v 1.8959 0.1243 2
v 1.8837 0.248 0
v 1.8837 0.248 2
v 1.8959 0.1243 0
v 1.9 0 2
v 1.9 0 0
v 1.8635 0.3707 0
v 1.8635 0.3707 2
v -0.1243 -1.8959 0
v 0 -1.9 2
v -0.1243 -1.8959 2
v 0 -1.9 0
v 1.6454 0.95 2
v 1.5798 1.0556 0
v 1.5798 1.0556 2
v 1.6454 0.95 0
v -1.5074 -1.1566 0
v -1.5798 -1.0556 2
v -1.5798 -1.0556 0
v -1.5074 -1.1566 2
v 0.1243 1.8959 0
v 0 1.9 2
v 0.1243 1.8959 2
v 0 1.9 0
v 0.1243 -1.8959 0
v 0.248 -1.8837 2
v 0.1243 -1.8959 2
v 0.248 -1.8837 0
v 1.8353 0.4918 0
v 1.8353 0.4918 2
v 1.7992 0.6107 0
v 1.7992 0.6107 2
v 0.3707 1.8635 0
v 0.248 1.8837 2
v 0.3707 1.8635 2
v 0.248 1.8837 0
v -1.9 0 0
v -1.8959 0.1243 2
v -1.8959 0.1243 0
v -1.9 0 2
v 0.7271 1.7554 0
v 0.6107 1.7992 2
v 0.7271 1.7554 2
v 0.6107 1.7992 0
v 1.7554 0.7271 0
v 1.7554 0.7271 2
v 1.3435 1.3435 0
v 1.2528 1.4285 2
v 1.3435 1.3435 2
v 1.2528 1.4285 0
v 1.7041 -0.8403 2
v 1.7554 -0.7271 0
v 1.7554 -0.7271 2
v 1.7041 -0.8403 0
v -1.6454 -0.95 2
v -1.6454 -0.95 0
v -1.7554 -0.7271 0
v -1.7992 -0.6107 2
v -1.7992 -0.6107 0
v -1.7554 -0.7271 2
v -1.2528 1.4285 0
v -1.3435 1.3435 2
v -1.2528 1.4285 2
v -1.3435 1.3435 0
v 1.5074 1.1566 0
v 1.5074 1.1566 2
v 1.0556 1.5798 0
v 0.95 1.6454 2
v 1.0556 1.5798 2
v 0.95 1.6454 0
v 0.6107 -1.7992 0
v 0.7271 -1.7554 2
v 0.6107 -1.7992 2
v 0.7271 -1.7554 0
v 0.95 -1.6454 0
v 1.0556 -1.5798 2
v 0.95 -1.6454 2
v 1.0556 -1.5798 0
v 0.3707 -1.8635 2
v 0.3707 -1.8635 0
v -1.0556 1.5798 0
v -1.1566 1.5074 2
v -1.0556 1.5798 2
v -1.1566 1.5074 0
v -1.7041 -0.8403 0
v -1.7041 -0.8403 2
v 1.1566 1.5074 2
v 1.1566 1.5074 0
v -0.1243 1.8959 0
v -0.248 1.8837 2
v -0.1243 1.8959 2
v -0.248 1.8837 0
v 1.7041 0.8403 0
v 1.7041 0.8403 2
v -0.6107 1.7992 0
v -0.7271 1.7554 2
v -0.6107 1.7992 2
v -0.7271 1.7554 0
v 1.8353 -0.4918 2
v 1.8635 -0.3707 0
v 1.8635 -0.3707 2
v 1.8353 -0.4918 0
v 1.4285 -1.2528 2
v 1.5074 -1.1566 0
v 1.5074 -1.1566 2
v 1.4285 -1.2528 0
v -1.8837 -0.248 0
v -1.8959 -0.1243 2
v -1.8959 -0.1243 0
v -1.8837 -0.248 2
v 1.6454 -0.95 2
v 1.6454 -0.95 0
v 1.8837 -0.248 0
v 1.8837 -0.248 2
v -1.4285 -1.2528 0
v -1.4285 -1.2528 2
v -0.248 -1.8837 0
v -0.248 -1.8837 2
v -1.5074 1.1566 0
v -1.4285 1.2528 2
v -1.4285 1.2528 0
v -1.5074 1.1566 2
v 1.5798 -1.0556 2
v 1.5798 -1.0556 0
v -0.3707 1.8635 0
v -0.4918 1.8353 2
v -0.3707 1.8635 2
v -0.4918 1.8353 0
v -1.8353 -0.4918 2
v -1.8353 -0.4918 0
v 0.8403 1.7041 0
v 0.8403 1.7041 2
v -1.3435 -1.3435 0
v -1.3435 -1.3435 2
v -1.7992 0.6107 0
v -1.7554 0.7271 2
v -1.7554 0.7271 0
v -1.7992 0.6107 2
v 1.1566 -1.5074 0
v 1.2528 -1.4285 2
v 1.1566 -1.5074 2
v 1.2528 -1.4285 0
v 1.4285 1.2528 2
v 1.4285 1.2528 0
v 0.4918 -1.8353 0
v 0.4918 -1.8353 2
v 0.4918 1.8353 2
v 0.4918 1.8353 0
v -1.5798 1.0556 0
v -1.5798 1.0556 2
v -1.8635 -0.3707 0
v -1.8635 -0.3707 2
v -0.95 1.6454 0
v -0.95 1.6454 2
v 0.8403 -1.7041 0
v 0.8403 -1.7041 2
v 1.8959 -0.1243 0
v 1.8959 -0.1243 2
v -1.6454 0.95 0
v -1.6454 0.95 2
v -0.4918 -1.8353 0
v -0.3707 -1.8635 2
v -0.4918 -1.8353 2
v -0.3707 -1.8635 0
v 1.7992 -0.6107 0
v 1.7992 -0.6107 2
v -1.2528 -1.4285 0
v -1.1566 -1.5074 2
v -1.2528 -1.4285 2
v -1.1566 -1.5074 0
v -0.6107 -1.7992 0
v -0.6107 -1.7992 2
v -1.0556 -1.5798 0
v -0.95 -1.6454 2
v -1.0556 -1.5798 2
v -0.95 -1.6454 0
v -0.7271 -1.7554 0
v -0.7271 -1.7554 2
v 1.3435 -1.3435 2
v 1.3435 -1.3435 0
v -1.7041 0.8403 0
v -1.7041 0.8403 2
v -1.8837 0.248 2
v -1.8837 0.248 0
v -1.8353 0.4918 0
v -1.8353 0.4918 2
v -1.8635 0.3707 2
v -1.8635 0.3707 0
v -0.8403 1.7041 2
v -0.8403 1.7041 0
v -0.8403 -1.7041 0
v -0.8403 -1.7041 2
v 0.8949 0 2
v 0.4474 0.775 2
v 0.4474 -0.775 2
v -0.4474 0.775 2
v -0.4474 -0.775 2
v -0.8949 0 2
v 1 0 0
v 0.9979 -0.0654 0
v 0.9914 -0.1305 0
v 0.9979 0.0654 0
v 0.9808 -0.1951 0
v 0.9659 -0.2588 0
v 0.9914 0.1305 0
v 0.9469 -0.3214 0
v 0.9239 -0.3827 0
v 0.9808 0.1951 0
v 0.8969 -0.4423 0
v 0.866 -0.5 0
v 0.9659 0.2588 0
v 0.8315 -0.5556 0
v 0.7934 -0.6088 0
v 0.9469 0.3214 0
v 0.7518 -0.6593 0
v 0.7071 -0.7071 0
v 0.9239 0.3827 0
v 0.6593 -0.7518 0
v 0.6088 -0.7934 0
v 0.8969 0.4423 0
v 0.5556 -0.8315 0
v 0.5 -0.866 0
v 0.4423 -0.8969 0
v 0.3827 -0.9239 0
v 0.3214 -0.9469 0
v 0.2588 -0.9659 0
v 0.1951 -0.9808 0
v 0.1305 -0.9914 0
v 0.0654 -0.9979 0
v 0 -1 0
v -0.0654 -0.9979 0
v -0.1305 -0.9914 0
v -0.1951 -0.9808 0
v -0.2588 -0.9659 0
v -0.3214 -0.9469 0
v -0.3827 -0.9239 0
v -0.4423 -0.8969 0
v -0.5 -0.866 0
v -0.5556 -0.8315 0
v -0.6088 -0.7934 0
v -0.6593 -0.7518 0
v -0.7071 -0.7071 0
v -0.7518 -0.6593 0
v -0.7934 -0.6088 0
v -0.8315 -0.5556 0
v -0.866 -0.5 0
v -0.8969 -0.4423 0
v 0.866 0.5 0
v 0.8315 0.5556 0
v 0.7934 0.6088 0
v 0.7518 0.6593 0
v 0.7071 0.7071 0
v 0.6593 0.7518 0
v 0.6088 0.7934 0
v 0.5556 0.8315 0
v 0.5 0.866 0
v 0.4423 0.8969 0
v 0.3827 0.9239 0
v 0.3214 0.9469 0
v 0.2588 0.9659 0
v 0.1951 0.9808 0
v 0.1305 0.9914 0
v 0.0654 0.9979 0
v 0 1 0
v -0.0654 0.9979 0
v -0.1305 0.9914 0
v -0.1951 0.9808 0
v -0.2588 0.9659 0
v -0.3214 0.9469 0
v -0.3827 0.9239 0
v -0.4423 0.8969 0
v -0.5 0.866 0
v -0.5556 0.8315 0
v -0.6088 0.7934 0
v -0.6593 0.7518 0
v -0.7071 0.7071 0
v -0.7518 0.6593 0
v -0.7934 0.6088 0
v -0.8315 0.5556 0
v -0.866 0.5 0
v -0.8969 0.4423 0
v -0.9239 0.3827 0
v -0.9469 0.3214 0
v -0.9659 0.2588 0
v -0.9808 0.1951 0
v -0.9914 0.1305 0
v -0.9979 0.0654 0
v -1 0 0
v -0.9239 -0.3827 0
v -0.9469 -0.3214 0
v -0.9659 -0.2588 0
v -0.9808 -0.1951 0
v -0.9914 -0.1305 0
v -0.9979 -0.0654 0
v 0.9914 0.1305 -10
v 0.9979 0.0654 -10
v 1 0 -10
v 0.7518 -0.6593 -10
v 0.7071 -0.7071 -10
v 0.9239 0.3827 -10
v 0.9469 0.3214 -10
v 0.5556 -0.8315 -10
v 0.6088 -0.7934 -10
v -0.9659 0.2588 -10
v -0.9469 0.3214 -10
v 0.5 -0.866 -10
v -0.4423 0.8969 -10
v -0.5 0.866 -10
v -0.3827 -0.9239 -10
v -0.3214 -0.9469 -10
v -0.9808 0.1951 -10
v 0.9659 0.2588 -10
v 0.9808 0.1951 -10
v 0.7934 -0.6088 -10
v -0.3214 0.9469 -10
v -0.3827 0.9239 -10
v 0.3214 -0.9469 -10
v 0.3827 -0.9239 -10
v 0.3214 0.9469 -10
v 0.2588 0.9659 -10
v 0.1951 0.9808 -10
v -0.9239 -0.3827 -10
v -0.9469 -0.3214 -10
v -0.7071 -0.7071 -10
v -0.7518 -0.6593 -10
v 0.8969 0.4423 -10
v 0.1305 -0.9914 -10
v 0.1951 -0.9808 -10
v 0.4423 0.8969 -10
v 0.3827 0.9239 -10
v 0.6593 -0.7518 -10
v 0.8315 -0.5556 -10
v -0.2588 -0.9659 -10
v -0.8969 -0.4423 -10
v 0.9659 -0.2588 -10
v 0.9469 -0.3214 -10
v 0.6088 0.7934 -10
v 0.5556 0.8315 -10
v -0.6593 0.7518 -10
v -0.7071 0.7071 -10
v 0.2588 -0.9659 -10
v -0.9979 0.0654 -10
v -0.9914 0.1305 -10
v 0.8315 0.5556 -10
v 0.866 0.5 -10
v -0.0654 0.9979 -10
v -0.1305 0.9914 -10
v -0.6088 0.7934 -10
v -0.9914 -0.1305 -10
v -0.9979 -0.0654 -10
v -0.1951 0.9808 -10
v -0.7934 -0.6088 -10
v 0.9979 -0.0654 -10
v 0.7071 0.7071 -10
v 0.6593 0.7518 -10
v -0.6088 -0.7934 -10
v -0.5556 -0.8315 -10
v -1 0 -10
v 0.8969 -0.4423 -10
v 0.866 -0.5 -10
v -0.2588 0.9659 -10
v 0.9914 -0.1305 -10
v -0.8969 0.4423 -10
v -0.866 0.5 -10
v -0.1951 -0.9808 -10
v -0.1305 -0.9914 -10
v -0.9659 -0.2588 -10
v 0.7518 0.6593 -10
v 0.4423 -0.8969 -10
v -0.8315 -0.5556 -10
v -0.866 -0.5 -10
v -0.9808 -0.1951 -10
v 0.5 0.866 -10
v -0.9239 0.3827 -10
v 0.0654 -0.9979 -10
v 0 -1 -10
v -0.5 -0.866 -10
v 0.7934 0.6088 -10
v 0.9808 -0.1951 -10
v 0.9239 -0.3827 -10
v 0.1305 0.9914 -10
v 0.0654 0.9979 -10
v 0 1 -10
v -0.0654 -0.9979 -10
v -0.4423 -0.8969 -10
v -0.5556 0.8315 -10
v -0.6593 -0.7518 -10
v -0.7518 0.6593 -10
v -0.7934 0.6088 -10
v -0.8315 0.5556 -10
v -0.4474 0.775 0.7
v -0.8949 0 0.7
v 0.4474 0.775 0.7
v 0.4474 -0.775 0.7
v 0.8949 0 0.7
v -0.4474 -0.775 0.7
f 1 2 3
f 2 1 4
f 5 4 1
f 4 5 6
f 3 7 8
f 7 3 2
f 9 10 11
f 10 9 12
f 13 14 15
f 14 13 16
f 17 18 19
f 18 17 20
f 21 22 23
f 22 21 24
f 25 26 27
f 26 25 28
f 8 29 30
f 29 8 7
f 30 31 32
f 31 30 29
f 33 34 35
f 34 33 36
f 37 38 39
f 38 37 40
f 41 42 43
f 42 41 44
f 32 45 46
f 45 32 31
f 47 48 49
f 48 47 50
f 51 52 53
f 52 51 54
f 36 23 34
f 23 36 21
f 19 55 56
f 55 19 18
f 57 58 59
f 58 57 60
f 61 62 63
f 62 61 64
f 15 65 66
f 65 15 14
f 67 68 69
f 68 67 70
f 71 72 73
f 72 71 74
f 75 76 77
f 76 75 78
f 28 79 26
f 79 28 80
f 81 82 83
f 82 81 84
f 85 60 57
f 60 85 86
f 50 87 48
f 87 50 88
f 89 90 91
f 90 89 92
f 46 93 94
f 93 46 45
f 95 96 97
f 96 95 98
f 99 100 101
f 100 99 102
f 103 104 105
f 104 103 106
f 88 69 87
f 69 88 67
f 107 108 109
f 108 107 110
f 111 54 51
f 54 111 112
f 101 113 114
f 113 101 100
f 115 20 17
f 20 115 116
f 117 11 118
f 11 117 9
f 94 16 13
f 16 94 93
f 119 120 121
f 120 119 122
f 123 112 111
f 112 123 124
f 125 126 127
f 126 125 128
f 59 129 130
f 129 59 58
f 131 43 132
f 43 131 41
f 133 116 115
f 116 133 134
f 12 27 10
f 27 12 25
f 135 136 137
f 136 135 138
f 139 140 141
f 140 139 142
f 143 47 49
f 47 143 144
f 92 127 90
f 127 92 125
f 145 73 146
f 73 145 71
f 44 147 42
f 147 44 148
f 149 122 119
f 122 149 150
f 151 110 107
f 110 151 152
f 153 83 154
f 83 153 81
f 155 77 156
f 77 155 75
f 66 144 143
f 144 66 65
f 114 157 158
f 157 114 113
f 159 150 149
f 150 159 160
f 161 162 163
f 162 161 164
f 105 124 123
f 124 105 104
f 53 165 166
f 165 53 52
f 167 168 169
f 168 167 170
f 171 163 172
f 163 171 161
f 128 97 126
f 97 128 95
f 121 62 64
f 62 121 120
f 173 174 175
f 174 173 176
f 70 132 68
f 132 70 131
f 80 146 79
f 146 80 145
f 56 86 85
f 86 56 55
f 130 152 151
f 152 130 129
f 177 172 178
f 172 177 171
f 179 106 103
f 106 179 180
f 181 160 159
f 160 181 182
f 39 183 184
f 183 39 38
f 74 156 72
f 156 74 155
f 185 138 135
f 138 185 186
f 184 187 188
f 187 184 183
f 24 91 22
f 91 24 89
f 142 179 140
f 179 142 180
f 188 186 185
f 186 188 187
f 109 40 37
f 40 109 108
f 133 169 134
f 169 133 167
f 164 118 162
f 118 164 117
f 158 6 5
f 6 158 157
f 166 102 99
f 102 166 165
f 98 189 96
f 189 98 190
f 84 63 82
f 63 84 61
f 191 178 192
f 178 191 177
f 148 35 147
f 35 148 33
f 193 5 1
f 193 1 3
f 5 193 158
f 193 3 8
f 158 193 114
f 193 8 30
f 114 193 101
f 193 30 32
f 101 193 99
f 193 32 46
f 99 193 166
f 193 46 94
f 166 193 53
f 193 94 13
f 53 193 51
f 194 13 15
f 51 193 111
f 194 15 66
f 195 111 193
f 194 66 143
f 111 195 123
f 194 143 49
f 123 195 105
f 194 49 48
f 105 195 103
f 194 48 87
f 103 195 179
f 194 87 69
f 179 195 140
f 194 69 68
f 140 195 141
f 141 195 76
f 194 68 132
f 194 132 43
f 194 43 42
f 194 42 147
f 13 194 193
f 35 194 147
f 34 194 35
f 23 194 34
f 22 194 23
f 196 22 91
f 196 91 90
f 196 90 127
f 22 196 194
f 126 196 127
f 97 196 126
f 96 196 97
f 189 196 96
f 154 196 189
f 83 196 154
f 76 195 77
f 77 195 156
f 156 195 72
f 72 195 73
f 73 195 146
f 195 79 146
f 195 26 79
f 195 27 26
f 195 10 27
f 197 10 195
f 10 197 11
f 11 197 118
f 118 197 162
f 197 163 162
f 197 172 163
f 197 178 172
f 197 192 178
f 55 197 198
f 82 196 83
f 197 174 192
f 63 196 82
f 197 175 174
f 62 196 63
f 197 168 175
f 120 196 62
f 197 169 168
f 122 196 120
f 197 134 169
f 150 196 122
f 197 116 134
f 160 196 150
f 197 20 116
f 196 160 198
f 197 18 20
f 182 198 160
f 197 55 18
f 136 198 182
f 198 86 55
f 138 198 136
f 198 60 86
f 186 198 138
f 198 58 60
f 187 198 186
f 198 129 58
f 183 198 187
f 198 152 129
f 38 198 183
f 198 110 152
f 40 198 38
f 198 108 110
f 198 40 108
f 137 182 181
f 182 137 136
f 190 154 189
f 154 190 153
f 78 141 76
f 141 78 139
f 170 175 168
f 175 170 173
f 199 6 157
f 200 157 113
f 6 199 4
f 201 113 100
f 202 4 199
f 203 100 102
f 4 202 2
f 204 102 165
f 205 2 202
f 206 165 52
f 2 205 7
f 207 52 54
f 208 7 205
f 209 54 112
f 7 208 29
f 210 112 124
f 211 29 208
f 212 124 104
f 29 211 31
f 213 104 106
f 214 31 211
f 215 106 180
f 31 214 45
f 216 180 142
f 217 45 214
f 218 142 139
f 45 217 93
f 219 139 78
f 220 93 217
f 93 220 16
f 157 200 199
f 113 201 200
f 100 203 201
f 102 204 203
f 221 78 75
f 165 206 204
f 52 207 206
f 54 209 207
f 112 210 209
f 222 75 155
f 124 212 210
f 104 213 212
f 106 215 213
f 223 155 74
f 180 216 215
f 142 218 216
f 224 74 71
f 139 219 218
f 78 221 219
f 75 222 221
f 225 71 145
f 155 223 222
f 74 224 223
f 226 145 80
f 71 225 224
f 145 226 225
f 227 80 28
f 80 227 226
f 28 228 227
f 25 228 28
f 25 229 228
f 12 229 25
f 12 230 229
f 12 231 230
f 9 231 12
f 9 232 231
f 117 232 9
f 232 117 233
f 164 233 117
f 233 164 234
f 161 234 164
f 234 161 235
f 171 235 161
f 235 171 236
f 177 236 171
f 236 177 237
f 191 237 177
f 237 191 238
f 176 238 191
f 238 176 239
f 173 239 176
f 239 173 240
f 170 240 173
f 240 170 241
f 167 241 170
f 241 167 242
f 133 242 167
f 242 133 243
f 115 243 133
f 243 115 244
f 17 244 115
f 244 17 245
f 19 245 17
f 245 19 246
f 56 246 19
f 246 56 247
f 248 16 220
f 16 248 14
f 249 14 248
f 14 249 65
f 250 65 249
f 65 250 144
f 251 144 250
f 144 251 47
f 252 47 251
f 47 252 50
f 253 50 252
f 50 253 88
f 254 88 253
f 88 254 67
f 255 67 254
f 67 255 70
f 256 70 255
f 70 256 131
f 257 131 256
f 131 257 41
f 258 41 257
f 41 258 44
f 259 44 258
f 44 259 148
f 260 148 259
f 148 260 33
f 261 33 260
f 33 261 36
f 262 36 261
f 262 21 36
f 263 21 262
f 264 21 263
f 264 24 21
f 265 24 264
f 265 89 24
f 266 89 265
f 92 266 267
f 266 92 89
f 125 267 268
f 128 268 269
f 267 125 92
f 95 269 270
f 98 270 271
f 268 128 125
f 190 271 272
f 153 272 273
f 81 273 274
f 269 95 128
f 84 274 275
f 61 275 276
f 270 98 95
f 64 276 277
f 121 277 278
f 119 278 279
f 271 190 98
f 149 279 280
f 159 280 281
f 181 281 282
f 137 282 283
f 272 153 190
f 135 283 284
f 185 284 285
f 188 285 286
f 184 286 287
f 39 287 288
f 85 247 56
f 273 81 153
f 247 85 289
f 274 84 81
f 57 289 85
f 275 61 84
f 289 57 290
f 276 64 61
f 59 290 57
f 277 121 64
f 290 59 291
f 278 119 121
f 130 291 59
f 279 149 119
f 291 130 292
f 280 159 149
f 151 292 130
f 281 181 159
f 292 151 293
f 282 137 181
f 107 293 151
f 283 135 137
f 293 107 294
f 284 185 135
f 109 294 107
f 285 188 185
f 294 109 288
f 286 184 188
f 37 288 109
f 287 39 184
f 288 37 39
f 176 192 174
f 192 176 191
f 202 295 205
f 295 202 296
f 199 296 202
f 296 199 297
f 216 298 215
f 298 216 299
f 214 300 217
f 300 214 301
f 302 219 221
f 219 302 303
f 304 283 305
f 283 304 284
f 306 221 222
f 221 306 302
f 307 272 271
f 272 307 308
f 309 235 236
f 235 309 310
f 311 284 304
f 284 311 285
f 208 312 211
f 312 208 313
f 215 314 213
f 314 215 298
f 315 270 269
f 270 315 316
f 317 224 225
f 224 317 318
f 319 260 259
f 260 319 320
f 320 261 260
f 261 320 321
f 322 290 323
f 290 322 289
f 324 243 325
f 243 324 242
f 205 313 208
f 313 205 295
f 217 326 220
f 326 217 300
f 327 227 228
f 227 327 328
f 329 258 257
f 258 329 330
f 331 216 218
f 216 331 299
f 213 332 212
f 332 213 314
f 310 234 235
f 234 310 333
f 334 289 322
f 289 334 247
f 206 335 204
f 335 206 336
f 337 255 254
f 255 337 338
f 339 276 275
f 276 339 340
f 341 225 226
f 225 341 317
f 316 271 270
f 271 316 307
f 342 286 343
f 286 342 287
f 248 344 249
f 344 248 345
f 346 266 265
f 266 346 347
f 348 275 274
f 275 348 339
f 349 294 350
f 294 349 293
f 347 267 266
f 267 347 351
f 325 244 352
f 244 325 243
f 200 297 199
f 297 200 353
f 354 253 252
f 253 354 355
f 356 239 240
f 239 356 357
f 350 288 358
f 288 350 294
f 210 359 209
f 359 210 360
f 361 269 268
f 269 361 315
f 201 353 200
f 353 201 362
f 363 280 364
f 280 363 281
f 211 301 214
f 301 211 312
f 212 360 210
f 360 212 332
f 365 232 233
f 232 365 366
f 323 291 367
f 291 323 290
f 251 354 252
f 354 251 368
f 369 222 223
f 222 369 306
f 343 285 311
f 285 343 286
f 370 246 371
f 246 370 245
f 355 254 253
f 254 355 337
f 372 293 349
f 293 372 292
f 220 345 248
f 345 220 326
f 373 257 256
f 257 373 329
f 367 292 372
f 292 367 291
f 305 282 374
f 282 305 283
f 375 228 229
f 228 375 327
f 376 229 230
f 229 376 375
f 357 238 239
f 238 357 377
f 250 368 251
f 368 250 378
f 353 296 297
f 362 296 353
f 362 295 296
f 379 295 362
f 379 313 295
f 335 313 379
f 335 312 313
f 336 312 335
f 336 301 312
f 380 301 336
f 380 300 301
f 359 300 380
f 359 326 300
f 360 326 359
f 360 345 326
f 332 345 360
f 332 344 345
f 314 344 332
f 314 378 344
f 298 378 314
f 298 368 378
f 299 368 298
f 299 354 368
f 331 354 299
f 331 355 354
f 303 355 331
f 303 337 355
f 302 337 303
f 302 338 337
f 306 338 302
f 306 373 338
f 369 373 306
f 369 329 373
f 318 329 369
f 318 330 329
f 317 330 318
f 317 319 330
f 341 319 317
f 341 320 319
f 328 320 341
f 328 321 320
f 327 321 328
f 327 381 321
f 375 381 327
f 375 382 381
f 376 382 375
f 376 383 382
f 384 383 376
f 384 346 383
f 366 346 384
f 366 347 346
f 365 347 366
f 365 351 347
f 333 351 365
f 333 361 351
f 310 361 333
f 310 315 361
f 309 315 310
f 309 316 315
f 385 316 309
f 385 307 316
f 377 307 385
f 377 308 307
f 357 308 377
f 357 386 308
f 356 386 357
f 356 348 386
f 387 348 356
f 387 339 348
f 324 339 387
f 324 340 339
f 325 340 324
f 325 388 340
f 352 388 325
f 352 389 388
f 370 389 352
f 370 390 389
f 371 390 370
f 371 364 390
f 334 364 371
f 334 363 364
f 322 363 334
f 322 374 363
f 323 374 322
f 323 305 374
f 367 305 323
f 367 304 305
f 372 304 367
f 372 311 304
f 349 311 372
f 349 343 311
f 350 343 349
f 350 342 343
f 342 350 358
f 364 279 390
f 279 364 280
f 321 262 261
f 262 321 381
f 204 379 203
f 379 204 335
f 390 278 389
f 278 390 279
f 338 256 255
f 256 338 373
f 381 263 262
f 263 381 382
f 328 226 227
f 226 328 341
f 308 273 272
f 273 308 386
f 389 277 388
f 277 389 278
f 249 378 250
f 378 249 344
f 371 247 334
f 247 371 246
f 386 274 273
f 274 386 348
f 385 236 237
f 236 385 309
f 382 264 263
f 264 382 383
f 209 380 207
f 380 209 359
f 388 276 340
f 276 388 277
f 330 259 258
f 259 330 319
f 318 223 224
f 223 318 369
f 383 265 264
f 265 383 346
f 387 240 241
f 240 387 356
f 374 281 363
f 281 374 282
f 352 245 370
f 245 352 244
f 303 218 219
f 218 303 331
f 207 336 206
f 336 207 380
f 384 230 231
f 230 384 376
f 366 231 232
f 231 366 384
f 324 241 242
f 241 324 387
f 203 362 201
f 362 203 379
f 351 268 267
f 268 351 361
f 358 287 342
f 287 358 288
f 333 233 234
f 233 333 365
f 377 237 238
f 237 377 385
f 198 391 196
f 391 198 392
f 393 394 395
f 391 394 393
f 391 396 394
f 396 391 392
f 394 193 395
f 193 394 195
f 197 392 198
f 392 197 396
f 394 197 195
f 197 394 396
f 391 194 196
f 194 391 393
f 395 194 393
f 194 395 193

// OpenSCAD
// Socket head cap screw (single connected solid)
// Dimensions:
// - Shank diameter: 2.0 mm
// - Head diameter: 3.8 mm
// - Head height: 2.0 mm
// - Overall length (under head): 10.0 mm

$fn = 96;

// Parameters
shank_diameter_mm = 2.0;      //[1.0:4.0:0.1]
length_mm = 10.0;             //[5.0:20.0:0.5]   // under-head length
head_diameter_mm = 3.8;       //[2.0:7.6:0.1]
head_height_mm = 2.0;         //[1.0:4.0:0.1]
hex_socket_af_mm = 1.5;       //[1.0:3.0:0.05]   // across flats
hex_socket_depth_mm = 1.2;    //[0.6:2.4:0.05]
overlap_mm = 0.2;             //[0.05:1.0:0.05]
socket_clearance_mm = 0.05;   //[0.0:0.2:0.01]

// Hex polygon points from across-flats (AF)
function hex_points_from_af(af) =
    let(R = af / sqrt(3))  // circumradius for regular hex given AF
    [ for (i = [0:5]) [ R*cos(60*i), R*sin(60*i) ] ];

module socket_head_cap_screw() {
    shank_r = shank_diameter_mm/2;
    head_r  = head_diameter_mm/2;

    // Place underside of head at z=0, head extends to +head_height, shank to -length
    difference() {
        union() {
            // Head
            translate([0, 0, head_height_mm/2])
                cylinder(r=head_r, h=head_height_mm, center=true);

            // Shank (slight overlap into head to ensure connectivity)
            translate([0, 0, -length_mm/2 + overlap_mm/2])
                cylinder(r=shank_r, h=length_mm + overlap_mm, center=true);
        }

        // Hex socket cut (from top face down)
        translate([0, 0, head_height_mm - hex_socket_depth_mm/2])
            linear_extrude(height=hex_socket_depth_mm + overlap_mm, center=true)
                polygon(points=hex_points_from_af(hex_socket_af_mm + socket_clearance_mm));
    }
}

socket_head_cap_screw();
